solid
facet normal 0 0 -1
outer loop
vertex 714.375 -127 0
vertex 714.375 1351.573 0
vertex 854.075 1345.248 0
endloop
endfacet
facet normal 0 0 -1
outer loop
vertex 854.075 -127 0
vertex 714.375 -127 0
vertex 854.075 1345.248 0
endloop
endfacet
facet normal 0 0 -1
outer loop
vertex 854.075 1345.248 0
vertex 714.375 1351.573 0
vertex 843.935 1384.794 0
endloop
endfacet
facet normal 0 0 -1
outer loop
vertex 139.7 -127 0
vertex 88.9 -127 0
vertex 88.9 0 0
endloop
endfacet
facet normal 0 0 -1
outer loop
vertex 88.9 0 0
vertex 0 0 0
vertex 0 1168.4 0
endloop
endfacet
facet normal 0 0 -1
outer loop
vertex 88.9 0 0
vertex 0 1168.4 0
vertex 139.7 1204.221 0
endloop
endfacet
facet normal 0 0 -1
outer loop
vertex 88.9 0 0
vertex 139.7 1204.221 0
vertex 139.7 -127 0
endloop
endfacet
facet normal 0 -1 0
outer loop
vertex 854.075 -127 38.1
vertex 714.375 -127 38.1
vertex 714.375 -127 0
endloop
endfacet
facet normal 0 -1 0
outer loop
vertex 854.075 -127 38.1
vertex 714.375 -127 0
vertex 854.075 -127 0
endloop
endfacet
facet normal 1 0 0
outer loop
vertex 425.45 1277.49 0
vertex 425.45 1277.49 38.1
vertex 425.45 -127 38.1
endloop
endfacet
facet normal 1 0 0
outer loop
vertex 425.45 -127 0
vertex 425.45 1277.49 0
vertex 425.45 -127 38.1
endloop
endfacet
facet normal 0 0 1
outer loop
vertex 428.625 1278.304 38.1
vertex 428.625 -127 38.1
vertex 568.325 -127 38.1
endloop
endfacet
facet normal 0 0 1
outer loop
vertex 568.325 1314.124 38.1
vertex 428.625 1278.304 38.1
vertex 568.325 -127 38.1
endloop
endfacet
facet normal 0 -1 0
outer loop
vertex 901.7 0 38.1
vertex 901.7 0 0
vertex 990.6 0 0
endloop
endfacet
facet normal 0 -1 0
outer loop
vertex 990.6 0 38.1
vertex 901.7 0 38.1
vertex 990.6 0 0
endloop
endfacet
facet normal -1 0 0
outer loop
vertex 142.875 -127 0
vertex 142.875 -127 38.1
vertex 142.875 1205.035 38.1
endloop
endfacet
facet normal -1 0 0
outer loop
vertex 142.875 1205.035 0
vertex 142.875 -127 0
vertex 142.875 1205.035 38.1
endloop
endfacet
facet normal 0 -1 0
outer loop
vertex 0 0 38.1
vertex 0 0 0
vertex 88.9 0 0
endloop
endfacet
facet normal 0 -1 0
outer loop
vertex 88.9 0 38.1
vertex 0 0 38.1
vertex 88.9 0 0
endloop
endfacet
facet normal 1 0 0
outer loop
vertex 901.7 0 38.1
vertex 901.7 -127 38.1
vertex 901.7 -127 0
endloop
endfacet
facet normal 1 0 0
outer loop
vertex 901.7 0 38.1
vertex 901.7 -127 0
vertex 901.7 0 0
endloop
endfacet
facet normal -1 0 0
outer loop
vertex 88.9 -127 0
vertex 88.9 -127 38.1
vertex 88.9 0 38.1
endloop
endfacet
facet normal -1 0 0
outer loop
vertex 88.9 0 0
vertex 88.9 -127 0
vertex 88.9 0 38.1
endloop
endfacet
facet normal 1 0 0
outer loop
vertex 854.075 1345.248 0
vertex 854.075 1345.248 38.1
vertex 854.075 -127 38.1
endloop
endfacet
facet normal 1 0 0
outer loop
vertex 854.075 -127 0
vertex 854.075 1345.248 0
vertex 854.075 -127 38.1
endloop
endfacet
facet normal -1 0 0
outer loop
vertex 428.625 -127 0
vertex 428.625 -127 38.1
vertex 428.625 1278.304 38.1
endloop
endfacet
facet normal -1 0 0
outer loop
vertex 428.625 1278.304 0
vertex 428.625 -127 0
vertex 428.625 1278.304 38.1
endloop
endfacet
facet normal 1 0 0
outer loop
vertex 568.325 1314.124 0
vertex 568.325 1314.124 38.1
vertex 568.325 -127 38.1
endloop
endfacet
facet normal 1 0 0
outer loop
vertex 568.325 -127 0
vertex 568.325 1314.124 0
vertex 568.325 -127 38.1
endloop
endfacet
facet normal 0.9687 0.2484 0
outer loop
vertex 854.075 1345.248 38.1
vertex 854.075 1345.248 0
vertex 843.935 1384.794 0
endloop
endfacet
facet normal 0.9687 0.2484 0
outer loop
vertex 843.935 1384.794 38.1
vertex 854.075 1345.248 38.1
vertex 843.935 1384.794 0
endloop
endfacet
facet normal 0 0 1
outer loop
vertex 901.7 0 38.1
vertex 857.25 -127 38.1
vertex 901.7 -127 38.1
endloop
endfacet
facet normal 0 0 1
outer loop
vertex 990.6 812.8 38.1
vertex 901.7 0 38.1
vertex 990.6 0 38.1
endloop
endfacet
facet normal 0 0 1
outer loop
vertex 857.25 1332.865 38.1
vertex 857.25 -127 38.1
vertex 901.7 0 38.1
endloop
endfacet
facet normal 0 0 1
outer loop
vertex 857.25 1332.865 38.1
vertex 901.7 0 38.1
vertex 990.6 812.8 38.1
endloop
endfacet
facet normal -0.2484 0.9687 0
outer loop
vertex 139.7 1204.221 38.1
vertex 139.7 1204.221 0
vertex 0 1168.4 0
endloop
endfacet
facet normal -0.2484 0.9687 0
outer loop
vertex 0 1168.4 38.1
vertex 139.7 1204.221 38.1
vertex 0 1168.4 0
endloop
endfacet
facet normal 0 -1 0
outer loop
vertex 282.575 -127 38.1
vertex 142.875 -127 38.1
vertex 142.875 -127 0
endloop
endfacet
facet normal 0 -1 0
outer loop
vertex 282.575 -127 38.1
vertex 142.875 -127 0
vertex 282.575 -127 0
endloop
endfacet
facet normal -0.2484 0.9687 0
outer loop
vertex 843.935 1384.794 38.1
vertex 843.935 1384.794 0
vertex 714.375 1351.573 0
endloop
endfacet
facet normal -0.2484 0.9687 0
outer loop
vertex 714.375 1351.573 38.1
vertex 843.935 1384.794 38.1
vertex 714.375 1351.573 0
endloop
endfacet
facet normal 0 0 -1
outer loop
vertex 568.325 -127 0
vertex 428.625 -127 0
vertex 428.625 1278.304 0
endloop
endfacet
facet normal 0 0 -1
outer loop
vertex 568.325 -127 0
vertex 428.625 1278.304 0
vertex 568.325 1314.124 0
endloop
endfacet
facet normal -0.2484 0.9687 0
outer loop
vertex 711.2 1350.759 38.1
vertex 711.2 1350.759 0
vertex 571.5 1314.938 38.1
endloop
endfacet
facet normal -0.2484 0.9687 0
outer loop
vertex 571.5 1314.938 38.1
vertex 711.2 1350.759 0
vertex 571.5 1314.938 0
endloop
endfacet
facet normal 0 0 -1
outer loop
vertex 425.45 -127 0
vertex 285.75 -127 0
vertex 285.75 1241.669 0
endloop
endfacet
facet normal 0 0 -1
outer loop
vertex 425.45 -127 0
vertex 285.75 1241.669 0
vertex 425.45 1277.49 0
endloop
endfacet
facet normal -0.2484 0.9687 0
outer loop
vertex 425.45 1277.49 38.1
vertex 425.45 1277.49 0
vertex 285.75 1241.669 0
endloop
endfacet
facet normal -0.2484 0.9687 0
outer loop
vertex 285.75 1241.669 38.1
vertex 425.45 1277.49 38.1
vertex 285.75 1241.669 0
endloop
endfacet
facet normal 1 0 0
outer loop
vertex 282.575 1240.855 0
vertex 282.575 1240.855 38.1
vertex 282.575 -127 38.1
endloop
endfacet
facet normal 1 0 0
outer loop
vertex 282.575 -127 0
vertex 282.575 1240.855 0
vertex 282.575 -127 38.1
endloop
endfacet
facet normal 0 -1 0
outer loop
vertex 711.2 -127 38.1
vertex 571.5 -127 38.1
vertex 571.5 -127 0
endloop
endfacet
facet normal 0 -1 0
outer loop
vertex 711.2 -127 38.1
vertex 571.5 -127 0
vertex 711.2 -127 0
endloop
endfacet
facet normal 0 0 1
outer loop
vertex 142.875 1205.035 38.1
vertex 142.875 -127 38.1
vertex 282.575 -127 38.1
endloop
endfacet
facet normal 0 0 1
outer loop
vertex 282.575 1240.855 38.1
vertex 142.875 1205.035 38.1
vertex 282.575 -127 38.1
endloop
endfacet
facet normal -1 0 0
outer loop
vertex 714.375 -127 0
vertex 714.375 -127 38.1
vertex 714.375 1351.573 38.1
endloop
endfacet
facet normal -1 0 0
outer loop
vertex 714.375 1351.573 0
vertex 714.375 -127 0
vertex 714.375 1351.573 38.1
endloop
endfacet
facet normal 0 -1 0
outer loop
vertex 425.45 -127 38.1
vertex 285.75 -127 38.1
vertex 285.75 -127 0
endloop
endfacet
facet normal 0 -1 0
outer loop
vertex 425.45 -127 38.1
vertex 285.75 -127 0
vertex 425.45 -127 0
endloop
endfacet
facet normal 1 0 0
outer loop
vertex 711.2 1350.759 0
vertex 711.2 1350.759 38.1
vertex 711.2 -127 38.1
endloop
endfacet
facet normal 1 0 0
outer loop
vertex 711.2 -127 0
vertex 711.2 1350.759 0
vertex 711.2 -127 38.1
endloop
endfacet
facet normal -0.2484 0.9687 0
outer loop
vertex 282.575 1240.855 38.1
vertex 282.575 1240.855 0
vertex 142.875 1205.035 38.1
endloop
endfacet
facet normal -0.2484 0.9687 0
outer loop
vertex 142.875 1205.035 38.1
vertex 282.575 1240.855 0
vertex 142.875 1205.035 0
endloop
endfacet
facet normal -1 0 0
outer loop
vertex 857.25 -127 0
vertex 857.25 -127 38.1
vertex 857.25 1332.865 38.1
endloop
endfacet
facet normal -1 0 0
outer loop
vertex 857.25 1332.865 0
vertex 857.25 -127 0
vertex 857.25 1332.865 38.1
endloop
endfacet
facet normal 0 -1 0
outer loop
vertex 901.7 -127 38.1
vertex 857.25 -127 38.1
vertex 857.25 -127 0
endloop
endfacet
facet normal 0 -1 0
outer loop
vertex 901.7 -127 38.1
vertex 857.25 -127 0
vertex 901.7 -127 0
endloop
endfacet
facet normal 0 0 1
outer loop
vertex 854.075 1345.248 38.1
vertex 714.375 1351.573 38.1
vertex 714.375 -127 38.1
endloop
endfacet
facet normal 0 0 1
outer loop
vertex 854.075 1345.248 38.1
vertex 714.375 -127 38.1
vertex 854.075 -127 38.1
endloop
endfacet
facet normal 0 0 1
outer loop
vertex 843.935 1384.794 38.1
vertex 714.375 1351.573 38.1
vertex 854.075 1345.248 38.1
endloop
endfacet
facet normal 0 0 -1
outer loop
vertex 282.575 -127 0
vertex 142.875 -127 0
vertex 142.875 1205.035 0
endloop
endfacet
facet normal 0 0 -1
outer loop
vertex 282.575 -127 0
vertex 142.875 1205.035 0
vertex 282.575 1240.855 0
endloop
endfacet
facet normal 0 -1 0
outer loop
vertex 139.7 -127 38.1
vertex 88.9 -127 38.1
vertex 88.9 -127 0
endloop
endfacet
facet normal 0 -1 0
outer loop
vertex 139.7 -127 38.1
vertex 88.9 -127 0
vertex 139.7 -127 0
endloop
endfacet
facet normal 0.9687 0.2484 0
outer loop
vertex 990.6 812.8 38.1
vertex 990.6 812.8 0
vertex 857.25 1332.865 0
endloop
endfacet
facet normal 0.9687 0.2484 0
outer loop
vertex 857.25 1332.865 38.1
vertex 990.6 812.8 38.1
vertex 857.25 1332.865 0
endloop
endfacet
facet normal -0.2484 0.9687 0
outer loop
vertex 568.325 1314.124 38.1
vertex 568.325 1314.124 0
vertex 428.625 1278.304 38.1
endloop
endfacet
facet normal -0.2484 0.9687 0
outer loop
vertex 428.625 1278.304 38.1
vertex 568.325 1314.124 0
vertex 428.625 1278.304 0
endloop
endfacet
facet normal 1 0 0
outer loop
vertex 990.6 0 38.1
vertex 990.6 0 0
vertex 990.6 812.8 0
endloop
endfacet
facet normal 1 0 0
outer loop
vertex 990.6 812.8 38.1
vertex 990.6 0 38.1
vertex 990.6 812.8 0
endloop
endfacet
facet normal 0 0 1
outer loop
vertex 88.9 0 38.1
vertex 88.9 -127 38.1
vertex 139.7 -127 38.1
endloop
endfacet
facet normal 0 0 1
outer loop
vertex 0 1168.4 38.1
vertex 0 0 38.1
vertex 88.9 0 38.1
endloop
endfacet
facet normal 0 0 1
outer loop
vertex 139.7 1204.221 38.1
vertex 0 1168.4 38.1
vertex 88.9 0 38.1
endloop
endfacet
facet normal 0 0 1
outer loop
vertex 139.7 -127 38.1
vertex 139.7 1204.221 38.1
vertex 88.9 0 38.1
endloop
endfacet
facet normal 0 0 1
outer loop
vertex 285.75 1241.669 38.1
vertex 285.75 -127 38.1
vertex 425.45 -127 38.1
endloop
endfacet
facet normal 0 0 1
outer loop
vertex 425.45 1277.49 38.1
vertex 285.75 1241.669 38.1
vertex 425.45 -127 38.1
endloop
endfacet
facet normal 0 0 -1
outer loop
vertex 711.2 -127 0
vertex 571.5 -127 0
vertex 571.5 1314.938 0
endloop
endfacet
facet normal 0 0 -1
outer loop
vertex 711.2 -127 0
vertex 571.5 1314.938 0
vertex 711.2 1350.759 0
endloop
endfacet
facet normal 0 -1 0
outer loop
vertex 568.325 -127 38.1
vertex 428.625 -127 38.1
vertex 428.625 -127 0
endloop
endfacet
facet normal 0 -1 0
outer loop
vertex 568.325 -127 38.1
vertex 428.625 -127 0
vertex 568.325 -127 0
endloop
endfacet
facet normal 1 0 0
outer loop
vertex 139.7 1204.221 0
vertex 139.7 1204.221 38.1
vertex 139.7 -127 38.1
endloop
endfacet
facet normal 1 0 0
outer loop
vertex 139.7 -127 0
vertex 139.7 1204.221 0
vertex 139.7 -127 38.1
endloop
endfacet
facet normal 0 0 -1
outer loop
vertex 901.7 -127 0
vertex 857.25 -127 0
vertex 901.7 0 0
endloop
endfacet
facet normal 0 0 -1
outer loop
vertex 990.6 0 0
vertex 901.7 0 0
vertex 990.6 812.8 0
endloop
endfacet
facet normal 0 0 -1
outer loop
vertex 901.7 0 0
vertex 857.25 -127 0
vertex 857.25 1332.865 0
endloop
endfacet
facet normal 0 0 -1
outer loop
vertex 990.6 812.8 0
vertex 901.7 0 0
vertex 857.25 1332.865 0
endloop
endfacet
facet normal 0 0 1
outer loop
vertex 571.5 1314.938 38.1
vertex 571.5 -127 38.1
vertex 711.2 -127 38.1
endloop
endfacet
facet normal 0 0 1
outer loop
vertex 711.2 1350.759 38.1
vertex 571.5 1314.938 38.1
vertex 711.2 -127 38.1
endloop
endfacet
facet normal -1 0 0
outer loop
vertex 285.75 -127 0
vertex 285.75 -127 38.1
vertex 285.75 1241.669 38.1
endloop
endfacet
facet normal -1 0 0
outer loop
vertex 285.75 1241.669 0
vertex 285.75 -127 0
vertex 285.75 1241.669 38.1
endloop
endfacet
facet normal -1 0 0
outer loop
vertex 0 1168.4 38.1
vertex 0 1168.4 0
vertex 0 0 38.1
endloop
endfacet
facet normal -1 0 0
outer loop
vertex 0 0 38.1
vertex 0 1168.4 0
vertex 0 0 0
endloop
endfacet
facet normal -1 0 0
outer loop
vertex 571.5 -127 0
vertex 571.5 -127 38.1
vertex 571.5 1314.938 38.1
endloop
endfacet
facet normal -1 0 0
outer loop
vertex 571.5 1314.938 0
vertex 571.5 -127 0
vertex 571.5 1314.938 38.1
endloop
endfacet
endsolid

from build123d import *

# Parameters (mm, degrees)
F1_DEPTH = 38.1
F2_W     = 812.8
F2_H     = 127
F3_DEPTH = 38.1
F5_DEPTH = 38.101


with BuildPart() as f1:
    # F0 (on Top) → F1 (new body)
    with BuildSketch(Plane.XY):
        Polygon((0, 1168.4), (0, 0), (990.6, 0), (990.6, 812.8), (843.9349784084, 1384.7935842073), align=None)
    extrude(amount=F1_DEPTH)

    # F2 (on face) → F3 (join)
    with BuildSketch(Plane.XY.offset(38.1)):
        with Locations((495.3, -63.5)):
            Rectangle(F2_W, F2_H)
    extrude(amount=-F3_DEPTH)

    # F4 (on face) → F5 (cut, through all)
    with BuildSketch(Plane.XY.offset(38.1)):
        Polygon((139.7, 1204.2205128205), (139.7, -127), (142.875, -127), (142.875, 1205.0346153846), align=None)
        Polygon((282.575, 1240.8551282051), (282.575, -127), (285.75, -127), (285.75, 1241.6692307692), align=None)
        Polygon((425.45, 1277.4897435897), (425.45, -127), (428.625, -127), (428.625, 1278.3038461538), align=None)
        Polygon((568.325, 1314.1243589744), (568.325, -127), (571.5, -127), (571.5, 1314.9384615385), align=None)
        Polygon((711.2, 1350.758974359), (711.2, -127), (714.375, -127), (714.375, 1351.5730769231), align=None)
        Polygon((854.075, 1345.2475), (854.075, -127), (857.25, -127), (857.25, 1332.865), align=None)
    extrude(amount=-F5_DEPTH, mode=Mode.SUBTRACT)


solid = f1.part
